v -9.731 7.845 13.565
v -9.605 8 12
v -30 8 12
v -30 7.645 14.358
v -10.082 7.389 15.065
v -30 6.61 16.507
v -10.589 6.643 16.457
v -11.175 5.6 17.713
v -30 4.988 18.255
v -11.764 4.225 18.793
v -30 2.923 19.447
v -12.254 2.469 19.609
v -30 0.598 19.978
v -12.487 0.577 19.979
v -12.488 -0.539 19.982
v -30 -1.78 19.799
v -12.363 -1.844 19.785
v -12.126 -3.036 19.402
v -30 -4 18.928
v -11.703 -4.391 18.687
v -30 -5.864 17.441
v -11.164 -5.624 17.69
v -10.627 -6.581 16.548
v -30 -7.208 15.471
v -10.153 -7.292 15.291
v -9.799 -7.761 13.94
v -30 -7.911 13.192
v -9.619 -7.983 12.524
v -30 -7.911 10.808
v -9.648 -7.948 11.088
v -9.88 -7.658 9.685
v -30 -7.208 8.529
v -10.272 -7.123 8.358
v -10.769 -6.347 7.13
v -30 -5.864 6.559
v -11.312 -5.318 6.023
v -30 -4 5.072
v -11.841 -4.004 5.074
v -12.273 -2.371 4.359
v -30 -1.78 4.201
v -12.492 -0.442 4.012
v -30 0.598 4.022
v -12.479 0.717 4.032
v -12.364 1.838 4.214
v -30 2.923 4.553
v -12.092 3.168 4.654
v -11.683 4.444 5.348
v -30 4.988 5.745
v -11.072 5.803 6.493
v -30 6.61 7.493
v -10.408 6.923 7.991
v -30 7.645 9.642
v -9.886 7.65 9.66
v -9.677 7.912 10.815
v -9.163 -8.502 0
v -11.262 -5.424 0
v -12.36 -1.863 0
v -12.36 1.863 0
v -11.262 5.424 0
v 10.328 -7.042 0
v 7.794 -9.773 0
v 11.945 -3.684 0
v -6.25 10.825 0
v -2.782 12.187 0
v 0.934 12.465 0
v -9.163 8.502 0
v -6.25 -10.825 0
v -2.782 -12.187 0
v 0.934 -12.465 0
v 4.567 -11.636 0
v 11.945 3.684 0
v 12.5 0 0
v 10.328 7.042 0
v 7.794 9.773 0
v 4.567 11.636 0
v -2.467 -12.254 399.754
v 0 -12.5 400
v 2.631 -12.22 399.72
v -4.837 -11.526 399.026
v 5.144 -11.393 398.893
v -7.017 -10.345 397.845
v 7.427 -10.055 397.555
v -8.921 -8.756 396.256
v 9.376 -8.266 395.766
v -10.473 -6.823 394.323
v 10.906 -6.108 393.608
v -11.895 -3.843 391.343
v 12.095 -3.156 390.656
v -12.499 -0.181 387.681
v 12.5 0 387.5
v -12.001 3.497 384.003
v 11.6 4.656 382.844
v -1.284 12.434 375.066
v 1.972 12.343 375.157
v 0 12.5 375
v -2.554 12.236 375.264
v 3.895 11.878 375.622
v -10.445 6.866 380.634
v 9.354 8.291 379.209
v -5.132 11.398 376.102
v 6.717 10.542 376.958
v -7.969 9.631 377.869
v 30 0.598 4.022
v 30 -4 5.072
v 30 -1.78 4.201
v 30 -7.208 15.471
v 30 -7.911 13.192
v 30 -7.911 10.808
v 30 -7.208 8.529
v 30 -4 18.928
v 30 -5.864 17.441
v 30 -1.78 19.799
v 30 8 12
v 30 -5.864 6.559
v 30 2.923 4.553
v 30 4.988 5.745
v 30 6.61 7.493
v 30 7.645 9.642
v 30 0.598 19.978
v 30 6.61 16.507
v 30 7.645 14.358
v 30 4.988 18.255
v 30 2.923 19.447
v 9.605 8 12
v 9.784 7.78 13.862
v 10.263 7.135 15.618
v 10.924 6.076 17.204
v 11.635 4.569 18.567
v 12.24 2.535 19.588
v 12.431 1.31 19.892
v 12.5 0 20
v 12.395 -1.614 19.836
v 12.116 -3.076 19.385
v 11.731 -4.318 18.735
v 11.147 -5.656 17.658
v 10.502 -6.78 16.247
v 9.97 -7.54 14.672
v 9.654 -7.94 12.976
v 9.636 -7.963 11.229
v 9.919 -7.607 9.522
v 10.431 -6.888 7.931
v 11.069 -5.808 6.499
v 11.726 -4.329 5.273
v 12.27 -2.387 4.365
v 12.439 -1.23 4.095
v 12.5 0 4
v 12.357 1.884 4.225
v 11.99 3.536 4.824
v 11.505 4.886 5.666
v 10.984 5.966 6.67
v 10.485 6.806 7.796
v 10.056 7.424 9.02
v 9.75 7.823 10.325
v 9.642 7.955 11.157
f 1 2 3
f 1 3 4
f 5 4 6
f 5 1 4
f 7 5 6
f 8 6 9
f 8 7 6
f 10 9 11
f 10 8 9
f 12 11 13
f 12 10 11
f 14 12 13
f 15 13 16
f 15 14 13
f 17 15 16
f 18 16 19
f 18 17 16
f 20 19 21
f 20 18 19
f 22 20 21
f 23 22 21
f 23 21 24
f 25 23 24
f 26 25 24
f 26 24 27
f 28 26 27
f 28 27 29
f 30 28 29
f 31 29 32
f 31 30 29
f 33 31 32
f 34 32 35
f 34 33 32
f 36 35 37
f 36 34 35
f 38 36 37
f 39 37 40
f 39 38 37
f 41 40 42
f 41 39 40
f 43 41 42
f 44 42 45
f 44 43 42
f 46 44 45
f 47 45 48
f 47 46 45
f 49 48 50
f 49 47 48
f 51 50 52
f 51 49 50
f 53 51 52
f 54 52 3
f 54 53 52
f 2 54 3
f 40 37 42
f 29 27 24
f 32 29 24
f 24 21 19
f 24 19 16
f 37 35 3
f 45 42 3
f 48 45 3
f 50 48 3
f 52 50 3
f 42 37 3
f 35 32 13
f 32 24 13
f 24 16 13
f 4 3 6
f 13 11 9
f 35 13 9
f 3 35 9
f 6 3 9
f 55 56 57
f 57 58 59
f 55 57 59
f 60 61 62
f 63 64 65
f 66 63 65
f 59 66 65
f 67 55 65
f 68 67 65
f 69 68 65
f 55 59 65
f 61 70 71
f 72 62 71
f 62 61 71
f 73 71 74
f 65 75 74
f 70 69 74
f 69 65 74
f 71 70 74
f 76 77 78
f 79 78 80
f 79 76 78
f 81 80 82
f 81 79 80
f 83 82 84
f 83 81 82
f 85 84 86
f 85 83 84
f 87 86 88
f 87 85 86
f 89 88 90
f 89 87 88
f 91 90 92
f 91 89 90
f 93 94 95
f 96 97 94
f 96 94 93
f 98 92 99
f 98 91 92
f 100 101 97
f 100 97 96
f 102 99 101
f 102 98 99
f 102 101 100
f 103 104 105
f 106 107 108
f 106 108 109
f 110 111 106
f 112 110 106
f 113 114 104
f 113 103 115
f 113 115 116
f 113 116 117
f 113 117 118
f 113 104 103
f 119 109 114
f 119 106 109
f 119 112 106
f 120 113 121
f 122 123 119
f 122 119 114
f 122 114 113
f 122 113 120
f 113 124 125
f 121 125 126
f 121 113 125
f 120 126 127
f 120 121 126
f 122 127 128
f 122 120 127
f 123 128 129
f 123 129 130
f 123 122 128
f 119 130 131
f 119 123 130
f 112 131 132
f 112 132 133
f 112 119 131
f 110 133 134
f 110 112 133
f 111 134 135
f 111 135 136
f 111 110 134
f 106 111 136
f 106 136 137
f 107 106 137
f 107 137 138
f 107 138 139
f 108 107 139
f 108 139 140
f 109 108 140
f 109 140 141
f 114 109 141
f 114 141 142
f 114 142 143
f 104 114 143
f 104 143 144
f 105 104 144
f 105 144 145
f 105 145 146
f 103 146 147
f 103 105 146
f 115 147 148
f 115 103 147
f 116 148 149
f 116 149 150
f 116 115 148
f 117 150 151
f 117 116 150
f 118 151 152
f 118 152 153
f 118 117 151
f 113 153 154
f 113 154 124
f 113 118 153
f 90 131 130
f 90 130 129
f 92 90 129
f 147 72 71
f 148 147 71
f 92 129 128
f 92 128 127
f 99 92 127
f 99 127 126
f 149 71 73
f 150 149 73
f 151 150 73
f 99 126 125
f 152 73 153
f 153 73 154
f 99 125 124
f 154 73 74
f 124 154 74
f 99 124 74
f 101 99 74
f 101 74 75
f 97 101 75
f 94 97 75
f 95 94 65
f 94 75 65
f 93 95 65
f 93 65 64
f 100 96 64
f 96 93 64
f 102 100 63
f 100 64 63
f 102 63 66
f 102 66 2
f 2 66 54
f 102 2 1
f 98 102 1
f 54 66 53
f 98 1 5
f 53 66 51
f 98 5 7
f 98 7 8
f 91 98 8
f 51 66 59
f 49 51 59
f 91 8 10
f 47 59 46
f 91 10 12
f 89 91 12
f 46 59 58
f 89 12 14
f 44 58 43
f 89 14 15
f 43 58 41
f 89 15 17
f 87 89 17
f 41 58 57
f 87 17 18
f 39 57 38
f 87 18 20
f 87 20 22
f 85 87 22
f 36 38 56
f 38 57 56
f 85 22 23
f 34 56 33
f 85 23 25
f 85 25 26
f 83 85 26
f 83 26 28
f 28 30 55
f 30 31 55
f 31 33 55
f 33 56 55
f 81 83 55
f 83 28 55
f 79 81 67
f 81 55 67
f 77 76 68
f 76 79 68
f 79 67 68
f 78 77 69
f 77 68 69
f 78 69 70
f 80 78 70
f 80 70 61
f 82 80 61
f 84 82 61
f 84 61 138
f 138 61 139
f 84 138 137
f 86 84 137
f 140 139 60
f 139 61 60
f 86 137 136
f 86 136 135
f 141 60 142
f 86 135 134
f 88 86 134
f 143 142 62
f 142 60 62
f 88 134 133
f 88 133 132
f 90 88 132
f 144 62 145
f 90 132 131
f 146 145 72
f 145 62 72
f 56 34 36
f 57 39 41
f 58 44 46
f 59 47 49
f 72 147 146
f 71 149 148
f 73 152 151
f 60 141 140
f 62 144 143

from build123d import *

# Parameters (mm, degrees)
F0_R          = 12.5
F1_DEPTH      = 400
F2_R          = 8
F3_DEPTH      = 30
F5_DEPTH      = 30.0010001
F5_DEPTH_BACK = 30.0010001


with BuildPart() as f1:
    # F0 (on Top) → F1 (new body)
    with BuildSketch(Plane.XY):
        Circle(F0_R)
    extrude(amount=F1_DEPTH)

    # F2 (on Right) → F3 (join, symmetric)
    with BuildSketch(Plane.YZ):
        with Locations((0, 12)):
            Circle(F2_R)
    extrude(amount=F3_DEPTH, both=True)

    # F4 (on Right) → F5 (cut, two sides)
    with BuildSketch(Plane.YZ) as f5_sk:
        Polygon((12.5, 400), (-12.5, 400), (12.5, 375), align=None)
    extrude(amount=-F5_DEPTH, mode=Mode.SUBTRACT)
    extrude(f5_sk.sketch, amount=F5_DEPTH_BACK, mode=Mode.SUBTRACT)


solid = f1.part
